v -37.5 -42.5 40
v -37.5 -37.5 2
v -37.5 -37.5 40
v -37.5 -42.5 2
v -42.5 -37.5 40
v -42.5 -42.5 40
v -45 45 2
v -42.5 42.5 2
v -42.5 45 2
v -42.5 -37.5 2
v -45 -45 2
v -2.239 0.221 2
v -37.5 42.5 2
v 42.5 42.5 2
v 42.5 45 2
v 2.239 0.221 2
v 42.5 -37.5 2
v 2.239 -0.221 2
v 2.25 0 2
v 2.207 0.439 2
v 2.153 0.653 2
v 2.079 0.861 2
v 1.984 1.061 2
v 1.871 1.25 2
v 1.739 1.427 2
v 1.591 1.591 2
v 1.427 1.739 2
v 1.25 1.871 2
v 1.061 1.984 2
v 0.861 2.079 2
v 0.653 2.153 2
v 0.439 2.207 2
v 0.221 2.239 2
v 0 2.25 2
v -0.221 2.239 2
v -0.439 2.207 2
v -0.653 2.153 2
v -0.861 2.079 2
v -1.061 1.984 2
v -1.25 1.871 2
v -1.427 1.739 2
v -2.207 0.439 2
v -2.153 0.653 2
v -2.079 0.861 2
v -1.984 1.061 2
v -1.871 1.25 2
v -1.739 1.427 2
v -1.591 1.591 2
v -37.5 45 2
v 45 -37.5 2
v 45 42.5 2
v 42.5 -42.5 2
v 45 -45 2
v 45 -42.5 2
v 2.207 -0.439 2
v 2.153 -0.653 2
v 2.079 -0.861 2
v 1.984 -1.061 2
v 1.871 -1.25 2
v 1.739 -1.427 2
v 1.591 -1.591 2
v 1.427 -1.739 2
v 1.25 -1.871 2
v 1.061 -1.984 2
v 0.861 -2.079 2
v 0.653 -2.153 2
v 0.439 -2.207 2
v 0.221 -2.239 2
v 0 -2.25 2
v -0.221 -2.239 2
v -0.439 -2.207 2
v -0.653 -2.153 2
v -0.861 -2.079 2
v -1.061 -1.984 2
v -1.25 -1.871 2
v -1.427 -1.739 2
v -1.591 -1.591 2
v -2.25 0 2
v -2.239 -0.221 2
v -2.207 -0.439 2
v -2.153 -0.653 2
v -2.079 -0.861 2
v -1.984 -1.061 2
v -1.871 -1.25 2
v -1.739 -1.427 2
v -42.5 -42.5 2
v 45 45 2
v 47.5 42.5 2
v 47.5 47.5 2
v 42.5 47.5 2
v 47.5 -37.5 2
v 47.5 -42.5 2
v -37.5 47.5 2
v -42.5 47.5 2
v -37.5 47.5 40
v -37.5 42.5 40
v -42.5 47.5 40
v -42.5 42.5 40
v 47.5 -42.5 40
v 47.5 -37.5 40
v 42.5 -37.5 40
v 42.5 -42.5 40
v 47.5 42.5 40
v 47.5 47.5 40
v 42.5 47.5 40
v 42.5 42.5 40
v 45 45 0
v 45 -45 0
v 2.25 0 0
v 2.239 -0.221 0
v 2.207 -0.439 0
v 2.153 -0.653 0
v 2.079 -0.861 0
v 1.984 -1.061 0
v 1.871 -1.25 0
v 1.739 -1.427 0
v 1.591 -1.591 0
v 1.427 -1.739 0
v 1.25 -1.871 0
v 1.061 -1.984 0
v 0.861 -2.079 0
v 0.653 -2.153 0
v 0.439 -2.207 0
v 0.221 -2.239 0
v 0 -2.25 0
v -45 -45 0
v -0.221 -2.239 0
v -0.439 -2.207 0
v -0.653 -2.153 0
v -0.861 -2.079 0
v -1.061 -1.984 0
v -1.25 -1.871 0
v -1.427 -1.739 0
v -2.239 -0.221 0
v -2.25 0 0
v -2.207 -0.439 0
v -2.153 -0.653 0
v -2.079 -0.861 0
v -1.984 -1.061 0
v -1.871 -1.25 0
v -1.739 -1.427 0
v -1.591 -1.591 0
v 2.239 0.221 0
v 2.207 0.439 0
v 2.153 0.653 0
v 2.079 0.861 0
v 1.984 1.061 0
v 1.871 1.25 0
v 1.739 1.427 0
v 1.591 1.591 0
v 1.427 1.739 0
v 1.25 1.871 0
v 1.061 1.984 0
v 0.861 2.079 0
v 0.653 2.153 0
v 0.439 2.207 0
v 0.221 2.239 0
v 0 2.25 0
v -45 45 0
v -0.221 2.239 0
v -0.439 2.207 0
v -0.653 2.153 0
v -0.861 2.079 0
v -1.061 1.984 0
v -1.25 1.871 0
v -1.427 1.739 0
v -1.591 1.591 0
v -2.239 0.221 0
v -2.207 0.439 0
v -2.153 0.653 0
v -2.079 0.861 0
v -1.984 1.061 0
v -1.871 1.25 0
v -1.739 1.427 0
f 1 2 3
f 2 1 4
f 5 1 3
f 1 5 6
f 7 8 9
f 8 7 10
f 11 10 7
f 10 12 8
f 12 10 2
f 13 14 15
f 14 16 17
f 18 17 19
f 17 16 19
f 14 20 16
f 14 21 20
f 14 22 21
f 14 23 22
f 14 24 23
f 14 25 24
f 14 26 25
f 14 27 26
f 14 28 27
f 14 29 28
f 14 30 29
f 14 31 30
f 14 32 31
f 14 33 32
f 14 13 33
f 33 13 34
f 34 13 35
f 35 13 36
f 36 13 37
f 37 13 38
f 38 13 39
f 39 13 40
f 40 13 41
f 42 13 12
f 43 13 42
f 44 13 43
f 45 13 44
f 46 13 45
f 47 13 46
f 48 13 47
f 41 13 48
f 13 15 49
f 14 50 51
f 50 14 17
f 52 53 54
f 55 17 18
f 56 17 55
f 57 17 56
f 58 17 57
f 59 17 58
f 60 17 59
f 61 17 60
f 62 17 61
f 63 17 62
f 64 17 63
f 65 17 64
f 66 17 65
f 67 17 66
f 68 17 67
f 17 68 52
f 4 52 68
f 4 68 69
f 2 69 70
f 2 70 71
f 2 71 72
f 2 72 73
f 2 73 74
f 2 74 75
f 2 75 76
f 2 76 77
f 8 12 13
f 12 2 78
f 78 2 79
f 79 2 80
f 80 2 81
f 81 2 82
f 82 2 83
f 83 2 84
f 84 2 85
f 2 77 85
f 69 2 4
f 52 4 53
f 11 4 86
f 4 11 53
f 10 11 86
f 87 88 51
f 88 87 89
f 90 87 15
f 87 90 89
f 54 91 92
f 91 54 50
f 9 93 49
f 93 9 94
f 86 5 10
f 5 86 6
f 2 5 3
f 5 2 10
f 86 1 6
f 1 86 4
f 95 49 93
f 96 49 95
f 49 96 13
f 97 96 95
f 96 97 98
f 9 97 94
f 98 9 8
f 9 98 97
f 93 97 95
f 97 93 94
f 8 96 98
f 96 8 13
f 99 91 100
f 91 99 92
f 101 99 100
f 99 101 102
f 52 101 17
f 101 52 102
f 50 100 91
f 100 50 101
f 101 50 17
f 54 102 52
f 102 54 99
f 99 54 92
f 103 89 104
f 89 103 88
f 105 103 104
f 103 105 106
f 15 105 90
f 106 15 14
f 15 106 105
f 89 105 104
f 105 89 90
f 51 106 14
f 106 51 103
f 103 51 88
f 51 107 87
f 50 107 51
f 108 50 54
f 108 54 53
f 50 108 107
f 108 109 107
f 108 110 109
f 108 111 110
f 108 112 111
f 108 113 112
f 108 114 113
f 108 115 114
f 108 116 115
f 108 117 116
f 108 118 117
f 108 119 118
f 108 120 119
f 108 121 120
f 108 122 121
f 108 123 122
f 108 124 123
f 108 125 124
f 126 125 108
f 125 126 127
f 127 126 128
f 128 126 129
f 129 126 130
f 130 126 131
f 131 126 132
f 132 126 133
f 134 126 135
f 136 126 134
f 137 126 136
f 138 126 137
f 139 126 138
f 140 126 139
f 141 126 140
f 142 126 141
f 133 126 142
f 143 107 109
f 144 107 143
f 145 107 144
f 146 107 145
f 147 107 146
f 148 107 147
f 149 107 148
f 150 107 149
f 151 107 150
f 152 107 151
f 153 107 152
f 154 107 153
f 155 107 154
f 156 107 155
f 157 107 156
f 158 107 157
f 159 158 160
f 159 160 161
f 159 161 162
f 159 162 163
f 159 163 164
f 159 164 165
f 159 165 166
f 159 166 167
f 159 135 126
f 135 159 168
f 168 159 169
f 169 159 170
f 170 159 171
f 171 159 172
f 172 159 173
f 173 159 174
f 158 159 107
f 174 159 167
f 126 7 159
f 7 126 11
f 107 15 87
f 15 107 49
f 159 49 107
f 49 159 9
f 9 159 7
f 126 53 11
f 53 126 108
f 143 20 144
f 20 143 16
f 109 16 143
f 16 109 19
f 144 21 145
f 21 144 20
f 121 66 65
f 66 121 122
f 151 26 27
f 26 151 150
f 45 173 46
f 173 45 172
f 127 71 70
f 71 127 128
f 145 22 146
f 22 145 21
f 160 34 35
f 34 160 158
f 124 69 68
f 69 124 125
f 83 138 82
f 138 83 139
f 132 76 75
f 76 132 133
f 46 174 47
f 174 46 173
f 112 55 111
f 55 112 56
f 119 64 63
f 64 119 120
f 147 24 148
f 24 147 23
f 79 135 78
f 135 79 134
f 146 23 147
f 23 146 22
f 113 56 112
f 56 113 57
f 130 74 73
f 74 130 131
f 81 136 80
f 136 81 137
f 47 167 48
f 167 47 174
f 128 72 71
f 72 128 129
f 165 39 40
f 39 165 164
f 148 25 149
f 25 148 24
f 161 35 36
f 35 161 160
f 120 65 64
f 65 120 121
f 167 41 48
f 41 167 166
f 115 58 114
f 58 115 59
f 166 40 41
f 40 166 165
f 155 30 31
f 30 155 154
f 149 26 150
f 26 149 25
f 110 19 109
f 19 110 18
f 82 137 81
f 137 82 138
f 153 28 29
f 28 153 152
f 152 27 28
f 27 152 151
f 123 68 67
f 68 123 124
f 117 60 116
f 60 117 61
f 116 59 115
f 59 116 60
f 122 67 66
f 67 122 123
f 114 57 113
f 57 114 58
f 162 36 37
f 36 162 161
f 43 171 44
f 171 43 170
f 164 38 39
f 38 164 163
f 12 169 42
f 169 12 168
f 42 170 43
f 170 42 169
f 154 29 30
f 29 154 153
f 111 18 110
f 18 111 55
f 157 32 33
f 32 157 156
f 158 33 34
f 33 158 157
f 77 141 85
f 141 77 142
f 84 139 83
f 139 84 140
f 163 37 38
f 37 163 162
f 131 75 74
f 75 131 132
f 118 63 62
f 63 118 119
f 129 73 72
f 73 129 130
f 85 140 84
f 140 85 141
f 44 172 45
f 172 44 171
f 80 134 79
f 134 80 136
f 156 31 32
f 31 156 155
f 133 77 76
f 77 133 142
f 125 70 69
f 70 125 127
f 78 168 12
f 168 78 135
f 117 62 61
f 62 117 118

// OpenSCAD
// DIY magnetic stirrer housing for 80 mm PC case fan
// Print orientation: top plate down on bed (z = 0), walls build upward (+Z)

$fn = 64;

// ---- Dimensions (mm) ----
plate_t      = 2;     // top plate thickness
wall_t       = 2.5;   // wall thickness
box_h        = 40;    // total height of box (top of walls)
outer_x      = 90;    // outer size in X
outer_y      = 90;    // outer size in Y
hole_d       = 4.5;   // screw hole diameter (M4)
hole_pitch   = 71.5;  // square pattern pitch for screw holes
notch_w      = 12;    // cable notch width
notch_depth  = 8;     // cable notch depth from open edge (z = 32 to 40)
eps          = 0.5;   // cutter overshoot past faces

// ---- Model ----
difference() {
    union() {
        // Top plate (lies on z = 0)
        translate([-outer_x / 2, -outer_y / 2, 0])
            cube([outer_x, outer_y, plate_t]);

        // Four walls rising from plate to z = box_h
        for (sx = [-1, 1], sy = [-1, 1])
            translate([sx * (outer_x / 2 - wall_t), sy * (outer_y / 2 - wall_t), plate_t])
                cube([2 * wall_t, 2 * wall_t, box_h - plate_t]);
    }

    // Screw holes through top plate on centred square pattern
    for (i = [0 : 3]) {
        x = -hole_pitch / 2 + (i - 1.5) * hole_pitch;
        y = -hole_pitch / 2 + (i - 1.5) * hole_pitch;
        translate([x, y, -eps])
            cylinder(d = hole_d, h = plate_t + 2 * eps);
    }

    // Cable notch in one wall, centred along the wall
    translate([-outer_x / 2 + wall_t, 0, box_h - notch_depth])
        cube([notch_w, wall_t, notch_depth + eps]);
}
